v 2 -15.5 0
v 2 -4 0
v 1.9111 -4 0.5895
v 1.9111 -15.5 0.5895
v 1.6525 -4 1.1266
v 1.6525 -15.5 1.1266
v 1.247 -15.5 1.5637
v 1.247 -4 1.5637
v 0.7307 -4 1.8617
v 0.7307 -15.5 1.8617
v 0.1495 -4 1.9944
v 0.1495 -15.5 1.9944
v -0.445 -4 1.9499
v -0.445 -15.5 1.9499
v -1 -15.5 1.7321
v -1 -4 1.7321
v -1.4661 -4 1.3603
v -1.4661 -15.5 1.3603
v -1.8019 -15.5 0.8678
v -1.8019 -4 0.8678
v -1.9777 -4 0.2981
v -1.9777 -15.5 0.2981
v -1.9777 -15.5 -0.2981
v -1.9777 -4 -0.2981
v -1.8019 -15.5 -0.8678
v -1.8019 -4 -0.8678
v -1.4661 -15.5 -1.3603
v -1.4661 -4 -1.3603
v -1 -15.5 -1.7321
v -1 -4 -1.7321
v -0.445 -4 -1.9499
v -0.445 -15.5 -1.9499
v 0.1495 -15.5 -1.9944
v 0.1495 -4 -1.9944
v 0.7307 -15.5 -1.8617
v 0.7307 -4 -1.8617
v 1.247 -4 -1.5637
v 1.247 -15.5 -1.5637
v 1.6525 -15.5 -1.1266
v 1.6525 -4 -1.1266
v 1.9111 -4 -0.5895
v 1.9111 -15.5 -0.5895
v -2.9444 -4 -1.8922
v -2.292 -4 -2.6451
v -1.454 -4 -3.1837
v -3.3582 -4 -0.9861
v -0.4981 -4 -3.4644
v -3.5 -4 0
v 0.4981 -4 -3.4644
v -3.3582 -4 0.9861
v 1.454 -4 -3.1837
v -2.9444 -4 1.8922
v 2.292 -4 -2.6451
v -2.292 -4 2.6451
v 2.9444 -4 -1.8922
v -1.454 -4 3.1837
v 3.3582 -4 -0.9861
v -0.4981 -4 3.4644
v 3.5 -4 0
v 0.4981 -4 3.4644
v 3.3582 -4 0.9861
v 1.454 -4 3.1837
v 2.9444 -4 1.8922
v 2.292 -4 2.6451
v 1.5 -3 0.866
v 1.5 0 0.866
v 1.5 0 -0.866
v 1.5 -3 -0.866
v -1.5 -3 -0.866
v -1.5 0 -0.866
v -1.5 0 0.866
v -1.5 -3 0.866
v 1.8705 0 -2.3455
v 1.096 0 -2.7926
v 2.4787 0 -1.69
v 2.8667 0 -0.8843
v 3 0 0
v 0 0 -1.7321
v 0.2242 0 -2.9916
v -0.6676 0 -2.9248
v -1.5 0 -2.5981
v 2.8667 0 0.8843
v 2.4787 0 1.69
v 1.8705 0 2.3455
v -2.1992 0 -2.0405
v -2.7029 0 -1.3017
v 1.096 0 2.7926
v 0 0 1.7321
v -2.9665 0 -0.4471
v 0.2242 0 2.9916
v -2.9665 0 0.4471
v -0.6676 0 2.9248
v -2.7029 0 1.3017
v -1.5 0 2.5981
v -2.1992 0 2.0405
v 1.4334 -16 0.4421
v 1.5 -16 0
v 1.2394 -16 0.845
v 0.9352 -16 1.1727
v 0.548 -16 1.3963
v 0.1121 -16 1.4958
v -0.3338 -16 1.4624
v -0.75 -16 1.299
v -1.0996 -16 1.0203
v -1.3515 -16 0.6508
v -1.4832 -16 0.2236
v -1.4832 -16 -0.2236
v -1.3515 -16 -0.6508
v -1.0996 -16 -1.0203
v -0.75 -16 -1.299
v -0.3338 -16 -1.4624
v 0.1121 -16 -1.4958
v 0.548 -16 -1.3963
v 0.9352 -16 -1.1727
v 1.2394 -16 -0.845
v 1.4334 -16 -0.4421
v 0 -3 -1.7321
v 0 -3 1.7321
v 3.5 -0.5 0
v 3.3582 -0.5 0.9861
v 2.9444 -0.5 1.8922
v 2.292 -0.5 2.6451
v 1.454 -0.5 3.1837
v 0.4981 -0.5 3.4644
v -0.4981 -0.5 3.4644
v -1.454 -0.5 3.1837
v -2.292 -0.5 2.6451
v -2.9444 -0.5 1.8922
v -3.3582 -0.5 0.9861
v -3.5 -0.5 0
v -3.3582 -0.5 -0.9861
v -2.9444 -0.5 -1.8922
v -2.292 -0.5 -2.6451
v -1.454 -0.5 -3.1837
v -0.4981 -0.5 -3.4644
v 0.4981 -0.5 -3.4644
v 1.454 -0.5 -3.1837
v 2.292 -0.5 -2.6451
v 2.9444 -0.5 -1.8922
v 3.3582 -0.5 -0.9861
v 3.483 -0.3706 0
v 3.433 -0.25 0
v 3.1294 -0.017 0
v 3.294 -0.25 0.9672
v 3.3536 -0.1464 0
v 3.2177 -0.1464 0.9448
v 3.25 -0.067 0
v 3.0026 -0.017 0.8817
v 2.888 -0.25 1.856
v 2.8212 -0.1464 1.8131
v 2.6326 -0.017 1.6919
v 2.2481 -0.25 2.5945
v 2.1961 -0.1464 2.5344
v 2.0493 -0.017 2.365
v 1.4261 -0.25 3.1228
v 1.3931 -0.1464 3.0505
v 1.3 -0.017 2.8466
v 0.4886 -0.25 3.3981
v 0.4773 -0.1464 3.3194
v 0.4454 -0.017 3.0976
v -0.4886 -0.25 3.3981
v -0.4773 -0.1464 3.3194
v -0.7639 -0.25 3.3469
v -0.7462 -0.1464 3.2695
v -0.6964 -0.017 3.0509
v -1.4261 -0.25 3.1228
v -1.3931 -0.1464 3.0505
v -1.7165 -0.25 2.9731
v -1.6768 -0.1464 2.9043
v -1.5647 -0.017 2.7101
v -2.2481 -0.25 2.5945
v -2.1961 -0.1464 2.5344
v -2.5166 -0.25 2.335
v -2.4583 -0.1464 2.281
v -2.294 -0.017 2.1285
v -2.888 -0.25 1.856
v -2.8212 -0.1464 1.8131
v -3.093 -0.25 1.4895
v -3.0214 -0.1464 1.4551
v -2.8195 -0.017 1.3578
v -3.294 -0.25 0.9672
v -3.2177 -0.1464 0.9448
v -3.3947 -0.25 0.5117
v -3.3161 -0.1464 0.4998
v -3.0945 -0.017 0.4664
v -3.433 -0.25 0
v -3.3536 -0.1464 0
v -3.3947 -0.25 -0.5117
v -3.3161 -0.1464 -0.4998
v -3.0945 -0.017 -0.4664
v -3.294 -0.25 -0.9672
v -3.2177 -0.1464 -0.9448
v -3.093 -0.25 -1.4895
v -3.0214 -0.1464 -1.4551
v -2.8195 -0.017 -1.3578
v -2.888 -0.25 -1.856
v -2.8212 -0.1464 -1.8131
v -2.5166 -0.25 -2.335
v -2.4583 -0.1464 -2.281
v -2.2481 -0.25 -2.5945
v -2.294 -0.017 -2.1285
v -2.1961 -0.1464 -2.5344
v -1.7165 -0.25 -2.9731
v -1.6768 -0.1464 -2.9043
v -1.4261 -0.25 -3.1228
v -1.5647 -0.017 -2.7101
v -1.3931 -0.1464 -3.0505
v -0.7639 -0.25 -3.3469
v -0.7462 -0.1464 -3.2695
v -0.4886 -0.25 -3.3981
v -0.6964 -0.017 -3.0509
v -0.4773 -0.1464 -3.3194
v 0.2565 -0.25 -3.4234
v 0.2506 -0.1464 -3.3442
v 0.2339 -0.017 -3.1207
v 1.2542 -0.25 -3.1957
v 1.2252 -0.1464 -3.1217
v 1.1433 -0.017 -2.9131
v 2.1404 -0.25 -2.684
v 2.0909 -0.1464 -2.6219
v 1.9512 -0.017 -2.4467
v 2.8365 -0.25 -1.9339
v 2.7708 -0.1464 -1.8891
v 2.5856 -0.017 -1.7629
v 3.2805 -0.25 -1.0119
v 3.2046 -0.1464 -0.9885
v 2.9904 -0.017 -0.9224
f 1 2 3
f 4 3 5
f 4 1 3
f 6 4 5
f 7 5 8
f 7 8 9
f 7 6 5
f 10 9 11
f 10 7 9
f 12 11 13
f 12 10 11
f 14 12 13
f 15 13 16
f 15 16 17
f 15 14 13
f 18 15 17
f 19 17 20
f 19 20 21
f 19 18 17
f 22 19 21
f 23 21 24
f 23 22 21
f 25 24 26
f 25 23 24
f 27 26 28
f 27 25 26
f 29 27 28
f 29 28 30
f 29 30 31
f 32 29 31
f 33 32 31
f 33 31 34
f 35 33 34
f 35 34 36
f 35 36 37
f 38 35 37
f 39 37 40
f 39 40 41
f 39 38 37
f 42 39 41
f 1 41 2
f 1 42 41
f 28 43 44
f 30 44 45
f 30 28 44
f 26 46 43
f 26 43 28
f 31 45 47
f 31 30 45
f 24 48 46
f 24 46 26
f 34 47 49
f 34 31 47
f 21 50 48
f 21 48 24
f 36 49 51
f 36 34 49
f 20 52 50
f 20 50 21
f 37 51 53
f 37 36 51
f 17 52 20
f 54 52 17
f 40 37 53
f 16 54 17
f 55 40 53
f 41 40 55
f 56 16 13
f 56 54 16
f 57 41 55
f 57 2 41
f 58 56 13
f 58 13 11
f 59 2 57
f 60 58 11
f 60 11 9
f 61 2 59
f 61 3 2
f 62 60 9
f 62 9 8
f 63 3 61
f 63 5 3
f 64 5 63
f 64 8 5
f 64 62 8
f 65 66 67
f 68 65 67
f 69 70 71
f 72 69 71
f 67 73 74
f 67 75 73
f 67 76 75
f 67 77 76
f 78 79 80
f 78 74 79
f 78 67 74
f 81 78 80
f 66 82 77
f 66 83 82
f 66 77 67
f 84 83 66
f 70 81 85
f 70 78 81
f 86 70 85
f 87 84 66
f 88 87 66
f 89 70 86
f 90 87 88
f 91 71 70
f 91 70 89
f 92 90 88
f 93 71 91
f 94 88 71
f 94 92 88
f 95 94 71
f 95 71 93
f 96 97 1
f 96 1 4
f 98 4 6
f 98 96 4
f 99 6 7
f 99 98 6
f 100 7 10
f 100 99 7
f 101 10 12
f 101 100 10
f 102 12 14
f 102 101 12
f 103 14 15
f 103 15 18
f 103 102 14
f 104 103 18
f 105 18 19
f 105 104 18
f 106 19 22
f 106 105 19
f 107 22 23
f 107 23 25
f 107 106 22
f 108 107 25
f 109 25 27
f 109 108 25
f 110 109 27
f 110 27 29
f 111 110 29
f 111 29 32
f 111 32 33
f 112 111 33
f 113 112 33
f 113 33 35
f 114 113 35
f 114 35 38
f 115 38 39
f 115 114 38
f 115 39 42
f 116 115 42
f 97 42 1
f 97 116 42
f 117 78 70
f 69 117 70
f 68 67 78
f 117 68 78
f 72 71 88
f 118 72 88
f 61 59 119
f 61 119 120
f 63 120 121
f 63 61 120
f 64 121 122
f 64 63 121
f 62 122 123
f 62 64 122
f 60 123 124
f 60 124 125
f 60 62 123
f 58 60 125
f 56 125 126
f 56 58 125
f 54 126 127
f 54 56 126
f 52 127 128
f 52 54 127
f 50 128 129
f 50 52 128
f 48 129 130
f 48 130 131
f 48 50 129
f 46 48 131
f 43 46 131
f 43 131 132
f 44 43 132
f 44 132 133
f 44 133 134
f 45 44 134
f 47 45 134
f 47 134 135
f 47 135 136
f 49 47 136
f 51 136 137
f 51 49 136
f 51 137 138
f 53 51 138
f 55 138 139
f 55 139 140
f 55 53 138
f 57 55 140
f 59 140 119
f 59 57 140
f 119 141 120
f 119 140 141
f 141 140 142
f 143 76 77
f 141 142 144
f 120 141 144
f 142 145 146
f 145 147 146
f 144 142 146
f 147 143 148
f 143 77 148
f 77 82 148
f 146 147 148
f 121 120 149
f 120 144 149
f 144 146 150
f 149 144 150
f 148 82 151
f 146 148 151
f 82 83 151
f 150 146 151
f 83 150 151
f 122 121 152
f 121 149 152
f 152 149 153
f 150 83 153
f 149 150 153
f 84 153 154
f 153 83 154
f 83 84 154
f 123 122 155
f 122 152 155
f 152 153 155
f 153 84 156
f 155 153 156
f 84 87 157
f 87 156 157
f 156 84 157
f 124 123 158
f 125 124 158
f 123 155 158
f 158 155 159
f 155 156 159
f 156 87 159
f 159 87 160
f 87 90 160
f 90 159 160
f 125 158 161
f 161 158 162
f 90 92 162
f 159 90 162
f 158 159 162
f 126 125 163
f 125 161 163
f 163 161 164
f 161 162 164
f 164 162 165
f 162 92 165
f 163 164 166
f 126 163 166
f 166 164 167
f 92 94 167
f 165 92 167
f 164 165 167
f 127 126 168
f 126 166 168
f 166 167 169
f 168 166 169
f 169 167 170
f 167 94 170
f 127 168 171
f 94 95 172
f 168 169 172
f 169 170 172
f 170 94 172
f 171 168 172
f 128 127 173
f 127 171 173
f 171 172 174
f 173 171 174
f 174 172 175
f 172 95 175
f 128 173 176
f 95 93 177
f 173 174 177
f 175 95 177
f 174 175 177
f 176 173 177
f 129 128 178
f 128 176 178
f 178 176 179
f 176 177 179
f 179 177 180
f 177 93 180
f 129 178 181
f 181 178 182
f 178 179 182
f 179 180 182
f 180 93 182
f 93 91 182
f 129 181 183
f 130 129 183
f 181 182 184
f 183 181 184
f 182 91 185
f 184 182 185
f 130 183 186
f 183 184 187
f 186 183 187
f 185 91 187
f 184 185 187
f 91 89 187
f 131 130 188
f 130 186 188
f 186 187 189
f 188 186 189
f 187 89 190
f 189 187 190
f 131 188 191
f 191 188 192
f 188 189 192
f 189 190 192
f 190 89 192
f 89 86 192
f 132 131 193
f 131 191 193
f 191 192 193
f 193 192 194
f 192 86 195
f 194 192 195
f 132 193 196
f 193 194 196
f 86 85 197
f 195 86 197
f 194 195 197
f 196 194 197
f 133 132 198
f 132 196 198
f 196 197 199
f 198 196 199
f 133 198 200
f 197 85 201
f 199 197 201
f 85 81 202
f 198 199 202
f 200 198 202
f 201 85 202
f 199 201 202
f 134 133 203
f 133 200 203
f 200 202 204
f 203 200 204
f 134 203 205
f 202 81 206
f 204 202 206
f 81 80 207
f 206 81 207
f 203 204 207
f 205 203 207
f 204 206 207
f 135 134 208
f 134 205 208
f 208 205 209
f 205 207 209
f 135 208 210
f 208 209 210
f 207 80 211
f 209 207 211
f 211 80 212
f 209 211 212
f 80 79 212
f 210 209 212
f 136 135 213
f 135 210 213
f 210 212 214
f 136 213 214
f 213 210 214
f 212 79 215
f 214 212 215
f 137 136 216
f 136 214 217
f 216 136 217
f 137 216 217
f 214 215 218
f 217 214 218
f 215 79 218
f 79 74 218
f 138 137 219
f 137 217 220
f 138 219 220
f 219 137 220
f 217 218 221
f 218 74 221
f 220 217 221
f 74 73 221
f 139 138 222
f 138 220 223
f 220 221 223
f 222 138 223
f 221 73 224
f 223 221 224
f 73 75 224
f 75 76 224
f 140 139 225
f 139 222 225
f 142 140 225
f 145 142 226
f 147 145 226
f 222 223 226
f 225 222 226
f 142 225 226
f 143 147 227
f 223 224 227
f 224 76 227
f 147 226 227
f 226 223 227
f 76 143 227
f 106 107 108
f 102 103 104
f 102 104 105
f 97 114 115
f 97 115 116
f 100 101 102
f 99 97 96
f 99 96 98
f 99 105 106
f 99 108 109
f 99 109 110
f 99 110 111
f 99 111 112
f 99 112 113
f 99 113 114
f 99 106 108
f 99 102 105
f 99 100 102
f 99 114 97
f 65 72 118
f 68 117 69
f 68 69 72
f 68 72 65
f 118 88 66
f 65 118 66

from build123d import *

# Parameters (mm, degrees)
CORTAR_EXTRUIR1_DEPTH = 3
CHAFL_N1_SIZE         = 0.5
REDONDEO1_R           = 0.5


with BuildPart() as part:
    # Croquis1 → Revolución1 (revolve)
    with BuildSketch(Plane.XY):
        Polygon((0, 0), (3.5, 0), (3.5, -4), (2, -4), (2, -16), (0, -16), align=None)
    revolve(axis=Axis((0, 0, 0), (0, -1, 0)))

    # Croquis2 → Cortar-Extruir1 (cut)
    with BuildSketch(Plane(origin=(0, 0, 0), x_dir=(1, 0, 0), z_dir=(0, 1, 0))):
        Polygon((1.5, 0.866025404), (0, 1.732050808), (-1.5, 0.866025404), (-1.5, -0.866025404), (0, -1.732050808), (1.5, -0.866025404), align=None)
    extrude(amount=-CORTAR_EXTRUIR1_DEPTH, mode=Mode.SUBTRACT)

    # Chaflán1
    chafl_n1_edges = [part.edges().sort_by_distance(p)[0] for p in [
        (-2, -16, 0),
    ]]
    chamfer(chafl_n1_edges, length=CHAFL_N1_SIZE)

    # Redondeo1
    redondeo1_edges = [part.edges().sort_by_distance(p)[0] for p in [
        (-3.5, 0, 0),
    ]]
    fillet(redondeo1_edges, radius=REDONDEO1_R)


solid = part.part
